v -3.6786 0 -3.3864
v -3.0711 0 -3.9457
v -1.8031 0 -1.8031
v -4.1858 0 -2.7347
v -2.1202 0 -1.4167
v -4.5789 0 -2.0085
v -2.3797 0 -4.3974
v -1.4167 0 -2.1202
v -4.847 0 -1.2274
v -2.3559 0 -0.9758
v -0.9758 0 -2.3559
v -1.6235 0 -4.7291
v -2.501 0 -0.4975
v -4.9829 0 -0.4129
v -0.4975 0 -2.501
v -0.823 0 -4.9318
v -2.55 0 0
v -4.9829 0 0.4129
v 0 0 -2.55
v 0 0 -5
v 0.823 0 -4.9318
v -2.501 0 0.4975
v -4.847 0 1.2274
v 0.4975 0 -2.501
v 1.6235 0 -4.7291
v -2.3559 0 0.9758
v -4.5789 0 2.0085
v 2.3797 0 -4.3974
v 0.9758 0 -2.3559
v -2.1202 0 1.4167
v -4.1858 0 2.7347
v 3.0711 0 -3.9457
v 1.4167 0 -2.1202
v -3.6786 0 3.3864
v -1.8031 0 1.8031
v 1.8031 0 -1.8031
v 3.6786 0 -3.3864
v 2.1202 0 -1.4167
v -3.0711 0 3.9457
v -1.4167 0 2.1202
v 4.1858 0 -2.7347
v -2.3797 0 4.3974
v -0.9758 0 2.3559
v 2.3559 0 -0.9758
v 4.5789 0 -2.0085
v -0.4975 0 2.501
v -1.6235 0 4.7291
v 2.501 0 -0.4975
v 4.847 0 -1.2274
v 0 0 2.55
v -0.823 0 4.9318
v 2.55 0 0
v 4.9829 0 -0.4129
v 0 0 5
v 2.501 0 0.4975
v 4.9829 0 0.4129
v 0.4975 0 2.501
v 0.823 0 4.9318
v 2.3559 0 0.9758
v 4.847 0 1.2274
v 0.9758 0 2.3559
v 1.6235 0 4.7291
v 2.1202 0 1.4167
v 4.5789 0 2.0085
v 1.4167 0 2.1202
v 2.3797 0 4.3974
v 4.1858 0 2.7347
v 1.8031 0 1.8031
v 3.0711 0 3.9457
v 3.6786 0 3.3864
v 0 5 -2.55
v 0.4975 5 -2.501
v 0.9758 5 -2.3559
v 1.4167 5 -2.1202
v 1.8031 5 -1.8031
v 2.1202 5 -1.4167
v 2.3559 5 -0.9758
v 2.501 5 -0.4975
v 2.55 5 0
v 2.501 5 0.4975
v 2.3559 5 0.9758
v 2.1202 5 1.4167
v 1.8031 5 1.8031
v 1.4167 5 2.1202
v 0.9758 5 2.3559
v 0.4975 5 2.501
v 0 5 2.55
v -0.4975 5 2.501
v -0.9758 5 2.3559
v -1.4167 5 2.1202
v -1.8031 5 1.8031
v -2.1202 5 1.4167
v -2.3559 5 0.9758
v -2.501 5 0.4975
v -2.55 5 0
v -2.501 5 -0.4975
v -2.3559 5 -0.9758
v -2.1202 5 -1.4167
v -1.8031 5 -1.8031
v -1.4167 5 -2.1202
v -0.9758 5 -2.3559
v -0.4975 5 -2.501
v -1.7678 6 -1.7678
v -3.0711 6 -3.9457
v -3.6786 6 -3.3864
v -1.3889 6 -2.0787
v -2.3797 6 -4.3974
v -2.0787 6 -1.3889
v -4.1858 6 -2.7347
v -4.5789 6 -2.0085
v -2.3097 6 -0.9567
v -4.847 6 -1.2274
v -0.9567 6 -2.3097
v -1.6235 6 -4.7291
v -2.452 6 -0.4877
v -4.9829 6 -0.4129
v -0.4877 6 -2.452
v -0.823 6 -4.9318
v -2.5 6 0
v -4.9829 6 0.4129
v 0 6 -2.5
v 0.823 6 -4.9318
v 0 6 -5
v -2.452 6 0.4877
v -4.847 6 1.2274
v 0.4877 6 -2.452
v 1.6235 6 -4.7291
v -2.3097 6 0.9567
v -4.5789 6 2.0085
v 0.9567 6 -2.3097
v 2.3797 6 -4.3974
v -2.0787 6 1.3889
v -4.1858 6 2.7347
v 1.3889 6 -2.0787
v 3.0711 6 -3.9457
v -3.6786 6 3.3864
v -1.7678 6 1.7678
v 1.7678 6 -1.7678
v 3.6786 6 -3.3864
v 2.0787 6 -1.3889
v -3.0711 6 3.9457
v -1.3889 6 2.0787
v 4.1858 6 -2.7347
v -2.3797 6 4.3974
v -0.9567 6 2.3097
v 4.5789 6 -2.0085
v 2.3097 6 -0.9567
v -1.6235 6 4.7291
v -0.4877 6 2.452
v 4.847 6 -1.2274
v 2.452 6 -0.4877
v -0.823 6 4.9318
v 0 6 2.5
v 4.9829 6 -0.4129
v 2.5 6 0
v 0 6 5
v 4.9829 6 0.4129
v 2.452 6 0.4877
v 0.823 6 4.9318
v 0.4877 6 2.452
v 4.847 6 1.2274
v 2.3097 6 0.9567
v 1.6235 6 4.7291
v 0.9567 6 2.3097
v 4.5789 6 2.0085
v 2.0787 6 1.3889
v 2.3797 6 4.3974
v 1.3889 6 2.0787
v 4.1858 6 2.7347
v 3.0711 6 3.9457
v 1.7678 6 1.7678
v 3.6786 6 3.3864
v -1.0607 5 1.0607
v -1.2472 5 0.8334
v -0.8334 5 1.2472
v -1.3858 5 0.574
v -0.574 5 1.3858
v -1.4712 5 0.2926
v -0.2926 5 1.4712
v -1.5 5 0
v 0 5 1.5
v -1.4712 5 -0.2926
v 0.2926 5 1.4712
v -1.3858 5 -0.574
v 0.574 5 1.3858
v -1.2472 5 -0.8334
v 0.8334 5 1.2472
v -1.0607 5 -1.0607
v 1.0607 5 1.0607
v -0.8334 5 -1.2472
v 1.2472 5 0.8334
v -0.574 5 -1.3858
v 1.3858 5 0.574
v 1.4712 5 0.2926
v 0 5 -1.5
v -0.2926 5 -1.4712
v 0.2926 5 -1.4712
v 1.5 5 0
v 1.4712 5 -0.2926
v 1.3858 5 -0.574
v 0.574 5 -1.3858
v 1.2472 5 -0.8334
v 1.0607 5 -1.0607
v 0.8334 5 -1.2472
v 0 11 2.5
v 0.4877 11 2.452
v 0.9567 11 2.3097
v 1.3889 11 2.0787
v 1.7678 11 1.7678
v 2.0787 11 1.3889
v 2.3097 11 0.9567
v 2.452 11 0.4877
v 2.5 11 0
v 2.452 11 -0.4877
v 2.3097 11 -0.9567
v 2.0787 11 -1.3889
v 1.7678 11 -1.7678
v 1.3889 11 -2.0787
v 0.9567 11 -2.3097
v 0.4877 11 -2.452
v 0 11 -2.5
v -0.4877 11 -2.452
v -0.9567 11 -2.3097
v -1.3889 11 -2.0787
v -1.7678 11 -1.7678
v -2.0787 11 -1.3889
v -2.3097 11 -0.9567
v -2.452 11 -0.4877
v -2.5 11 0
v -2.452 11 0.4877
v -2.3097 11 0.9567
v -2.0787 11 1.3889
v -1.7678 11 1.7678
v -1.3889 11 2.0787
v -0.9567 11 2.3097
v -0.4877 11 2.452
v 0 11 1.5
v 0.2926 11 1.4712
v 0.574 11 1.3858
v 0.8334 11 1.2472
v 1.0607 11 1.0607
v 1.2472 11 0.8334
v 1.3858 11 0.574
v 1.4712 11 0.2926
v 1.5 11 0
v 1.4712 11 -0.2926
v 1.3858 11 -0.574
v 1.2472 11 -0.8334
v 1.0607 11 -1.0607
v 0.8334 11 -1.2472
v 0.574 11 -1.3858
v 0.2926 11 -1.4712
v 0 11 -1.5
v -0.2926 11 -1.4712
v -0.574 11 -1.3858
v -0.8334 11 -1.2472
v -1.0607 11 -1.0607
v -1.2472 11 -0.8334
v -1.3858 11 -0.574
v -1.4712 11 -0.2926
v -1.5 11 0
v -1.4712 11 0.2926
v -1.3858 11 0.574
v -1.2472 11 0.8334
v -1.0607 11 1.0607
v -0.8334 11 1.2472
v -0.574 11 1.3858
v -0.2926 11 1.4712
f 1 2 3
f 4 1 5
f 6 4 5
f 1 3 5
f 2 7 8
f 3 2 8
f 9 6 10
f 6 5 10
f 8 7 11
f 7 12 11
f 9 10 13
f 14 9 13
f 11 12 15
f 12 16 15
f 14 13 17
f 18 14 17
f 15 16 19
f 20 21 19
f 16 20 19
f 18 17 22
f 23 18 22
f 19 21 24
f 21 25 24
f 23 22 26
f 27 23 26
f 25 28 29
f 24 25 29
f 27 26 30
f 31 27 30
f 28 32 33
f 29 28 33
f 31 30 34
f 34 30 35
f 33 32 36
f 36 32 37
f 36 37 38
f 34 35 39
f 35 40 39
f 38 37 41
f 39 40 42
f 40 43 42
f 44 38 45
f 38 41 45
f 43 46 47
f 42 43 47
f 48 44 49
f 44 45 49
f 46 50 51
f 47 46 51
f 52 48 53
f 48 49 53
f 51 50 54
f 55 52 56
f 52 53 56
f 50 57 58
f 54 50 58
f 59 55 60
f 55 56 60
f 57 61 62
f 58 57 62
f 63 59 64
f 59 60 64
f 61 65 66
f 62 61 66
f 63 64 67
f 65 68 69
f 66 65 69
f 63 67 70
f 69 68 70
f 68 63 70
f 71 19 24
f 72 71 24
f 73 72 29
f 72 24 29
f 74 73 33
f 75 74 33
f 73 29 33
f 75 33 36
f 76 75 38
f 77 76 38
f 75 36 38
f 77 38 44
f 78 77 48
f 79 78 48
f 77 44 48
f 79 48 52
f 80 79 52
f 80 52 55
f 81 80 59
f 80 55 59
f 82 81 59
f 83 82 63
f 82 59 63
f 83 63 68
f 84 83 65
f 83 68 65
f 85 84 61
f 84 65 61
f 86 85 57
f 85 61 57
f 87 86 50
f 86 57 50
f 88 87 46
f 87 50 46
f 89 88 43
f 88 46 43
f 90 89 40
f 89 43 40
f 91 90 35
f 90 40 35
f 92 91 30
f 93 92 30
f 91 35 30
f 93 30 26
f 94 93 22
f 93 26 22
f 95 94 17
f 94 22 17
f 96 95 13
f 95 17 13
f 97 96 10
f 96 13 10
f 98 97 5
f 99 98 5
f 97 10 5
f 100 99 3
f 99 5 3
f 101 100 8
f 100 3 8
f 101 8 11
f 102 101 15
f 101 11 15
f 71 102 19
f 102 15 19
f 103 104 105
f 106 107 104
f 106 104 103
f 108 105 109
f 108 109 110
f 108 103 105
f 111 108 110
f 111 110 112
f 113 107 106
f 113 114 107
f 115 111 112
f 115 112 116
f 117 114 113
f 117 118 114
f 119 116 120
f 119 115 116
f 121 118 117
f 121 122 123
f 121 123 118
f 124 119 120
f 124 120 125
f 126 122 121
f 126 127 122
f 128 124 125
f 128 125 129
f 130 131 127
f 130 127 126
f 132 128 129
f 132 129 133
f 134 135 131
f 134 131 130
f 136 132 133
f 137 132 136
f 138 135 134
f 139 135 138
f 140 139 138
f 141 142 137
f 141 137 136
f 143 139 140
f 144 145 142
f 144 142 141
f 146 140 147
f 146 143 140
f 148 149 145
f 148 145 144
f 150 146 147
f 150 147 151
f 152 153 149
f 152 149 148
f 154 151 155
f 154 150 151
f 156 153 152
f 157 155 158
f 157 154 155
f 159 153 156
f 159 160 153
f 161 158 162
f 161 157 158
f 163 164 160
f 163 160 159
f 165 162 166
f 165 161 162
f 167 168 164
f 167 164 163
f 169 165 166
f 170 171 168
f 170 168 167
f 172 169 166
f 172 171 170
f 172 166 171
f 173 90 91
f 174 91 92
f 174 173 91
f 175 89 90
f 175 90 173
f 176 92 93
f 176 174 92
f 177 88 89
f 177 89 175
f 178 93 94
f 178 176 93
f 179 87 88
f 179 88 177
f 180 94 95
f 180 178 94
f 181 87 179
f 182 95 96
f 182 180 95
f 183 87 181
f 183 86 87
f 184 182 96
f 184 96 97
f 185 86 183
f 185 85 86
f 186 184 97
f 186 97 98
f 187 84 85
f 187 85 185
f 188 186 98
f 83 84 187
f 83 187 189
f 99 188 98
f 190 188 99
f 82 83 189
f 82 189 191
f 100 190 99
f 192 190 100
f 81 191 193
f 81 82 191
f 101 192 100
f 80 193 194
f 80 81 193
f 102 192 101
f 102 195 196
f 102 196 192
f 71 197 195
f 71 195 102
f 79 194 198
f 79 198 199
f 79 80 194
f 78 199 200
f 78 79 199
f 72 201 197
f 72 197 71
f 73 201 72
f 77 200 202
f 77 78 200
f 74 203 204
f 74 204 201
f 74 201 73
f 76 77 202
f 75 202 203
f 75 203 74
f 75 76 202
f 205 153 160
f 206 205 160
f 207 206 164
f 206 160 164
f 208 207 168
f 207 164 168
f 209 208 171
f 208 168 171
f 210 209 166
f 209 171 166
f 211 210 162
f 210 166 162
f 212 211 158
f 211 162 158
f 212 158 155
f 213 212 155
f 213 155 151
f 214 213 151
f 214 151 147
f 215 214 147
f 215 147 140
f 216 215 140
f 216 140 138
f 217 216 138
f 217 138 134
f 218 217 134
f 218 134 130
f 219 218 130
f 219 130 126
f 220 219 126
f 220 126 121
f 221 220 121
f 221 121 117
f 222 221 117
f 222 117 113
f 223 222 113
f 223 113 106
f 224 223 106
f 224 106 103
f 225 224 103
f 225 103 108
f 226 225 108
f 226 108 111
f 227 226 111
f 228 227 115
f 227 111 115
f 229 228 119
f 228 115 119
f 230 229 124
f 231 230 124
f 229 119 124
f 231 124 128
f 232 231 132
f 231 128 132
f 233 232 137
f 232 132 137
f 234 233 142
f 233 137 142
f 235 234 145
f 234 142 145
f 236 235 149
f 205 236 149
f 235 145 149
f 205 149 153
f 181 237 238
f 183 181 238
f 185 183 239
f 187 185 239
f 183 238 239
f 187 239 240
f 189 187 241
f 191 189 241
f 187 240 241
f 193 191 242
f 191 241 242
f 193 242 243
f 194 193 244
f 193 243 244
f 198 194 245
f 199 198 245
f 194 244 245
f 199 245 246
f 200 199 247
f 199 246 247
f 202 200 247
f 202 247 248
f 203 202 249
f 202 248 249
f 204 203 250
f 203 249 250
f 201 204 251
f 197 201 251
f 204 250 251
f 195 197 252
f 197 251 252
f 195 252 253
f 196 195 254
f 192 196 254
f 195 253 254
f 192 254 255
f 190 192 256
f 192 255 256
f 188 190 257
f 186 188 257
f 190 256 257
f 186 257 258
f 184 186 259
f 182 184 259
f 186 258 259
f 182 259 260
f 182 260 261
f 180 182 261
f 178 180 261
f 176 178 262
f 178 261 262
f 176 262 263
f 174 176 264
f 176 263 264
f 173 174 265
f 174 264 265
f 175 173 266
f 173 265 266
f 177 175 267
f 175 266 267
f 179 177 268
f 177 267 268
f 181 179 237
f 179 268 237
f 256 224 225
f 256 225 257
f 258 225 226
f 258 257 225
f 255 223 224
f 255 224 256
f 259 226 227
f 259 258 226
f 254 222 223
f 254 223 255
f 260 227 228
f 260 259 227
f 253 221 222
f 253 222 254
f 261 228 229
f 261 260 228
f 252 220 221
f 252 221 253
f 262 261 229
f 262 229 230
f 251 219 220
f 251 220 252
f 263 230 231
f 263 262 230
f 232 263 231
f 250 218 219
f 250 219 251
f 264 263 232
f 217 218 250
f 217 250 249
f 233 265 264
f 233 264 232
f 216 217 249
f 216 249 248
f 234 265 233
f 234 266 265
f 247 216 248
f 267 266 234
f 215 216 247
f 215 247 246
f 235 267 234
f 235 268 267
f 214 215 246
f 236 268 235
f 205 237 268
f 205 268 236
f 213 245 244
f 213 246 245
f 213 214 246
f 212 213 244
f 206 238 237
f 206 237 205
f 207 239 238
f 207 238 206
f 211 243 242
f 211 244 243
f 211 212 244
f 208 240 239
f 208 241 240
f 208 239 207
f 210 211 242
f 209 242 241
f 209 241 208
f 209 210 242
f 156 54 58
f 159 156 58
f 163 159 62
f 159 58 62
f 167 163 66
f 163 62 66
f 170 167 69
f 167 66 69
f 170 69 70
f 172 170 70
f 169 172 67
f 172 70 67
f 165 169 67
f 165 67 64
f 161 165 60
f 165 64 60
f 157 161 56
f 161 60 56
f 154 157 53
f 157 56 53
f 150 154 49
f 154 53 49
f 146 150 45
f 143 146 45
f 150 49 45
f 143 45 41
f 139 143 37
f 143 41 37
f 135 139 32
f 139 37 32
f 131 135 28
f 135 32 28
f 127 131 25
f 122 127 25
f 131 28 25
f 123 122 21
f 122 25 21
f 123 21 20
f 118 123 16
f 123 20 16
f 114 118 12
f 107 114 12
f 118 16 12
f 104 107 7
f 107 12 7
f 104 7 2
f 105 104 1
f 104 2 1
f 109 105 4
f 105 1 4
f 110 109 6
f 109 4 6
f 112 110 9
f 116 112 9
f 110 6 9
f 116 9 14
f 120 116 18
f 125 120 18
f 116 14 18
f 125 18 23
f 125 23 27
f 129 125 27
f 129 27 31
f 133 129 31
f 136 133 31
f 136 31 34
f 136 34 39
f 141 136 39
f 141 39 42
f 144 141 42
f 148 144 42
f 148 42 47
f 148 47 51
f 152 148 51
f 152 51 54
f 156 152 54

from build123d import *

# Parameters (mm, degrees)
ESQUISSE1_R             = 5
BOSS_EXTRU_1_DEPTH      = 6
BOSS_EXTRU_2_DEPTH      = 5
BOSS_EXTRU_2_DEPTH_BACK = 1
ESQUISSE2_R             = 2.5
ESQUISSE3_R             = 1.5
ENL_V_MAT_EXTRU_2_DEPTH = 6
ESQUISSE4_R             = 2.55
ENL_V_MAT_EXTRU_3_DEPTH = 5


with BuildPart() as part:
    # Esquisse1 → Boss.-Extru.1 (new body)
    with BuildSketch(Plane(origin=(0, 0, 0), x_dir=(1, 0, 0), z_dir=(0, 1, 0))):
        with Locations(Location((0, 0, 0), (0, 0, 270))):
            Circle(ESQUISSE1_R)
    extrude(amount=BOSS_EXTRU_1_DEPTH)

    # Esquisse2 → Boss.-Extru.2 (add, two sides: drawn at the far end of the back side and taken through both)
    with BuildSketch(Plane(origin=(0, 6, 0), x_dir=(1, 0, 0), z_dir=(0, 1, 0)).offset(-BOSS_EXTRU_2_DEPTH_BACK)):
        with Locations(Location((0, 0, 0), (0, 0, 270))):
            Circle(ESQUISSE2_R)
    extrude(amount=BOSS_EXTRU_2_DEPTH + BOSS_EXTRU_2_DEPTH_BACK)

    # Esquisse3 → Enlèv. mat.-Extru.2 (cut)
    with BuildSketch(Plane(origin=(0, 11, 0), x_dir=(1, 0, 0), z_dir=(0, 1, 0))):
        with Locations(Location((0, 0, 0), (0, 0, 270))):
            Circle(ESQUISSE3_R)
    extrude(amount=-ENL_V_MAT_EXTRU_2_DEPTH, mode=Mode.SUBTRACT)

    # Esquisse4 → Enlèv. mat.-Extru.3 (cut)
    with BuildSketch(Plane.XZ):
        with Locations(Location((0, 0, 0), (0, 0, 270))):
            Circle(ESQUISSE4_R)
    extrude(amount=-ENL_V_MAT_EXTRU_3_DEPTH, mode=Mode.SUBTRACT)


solid = part.part
